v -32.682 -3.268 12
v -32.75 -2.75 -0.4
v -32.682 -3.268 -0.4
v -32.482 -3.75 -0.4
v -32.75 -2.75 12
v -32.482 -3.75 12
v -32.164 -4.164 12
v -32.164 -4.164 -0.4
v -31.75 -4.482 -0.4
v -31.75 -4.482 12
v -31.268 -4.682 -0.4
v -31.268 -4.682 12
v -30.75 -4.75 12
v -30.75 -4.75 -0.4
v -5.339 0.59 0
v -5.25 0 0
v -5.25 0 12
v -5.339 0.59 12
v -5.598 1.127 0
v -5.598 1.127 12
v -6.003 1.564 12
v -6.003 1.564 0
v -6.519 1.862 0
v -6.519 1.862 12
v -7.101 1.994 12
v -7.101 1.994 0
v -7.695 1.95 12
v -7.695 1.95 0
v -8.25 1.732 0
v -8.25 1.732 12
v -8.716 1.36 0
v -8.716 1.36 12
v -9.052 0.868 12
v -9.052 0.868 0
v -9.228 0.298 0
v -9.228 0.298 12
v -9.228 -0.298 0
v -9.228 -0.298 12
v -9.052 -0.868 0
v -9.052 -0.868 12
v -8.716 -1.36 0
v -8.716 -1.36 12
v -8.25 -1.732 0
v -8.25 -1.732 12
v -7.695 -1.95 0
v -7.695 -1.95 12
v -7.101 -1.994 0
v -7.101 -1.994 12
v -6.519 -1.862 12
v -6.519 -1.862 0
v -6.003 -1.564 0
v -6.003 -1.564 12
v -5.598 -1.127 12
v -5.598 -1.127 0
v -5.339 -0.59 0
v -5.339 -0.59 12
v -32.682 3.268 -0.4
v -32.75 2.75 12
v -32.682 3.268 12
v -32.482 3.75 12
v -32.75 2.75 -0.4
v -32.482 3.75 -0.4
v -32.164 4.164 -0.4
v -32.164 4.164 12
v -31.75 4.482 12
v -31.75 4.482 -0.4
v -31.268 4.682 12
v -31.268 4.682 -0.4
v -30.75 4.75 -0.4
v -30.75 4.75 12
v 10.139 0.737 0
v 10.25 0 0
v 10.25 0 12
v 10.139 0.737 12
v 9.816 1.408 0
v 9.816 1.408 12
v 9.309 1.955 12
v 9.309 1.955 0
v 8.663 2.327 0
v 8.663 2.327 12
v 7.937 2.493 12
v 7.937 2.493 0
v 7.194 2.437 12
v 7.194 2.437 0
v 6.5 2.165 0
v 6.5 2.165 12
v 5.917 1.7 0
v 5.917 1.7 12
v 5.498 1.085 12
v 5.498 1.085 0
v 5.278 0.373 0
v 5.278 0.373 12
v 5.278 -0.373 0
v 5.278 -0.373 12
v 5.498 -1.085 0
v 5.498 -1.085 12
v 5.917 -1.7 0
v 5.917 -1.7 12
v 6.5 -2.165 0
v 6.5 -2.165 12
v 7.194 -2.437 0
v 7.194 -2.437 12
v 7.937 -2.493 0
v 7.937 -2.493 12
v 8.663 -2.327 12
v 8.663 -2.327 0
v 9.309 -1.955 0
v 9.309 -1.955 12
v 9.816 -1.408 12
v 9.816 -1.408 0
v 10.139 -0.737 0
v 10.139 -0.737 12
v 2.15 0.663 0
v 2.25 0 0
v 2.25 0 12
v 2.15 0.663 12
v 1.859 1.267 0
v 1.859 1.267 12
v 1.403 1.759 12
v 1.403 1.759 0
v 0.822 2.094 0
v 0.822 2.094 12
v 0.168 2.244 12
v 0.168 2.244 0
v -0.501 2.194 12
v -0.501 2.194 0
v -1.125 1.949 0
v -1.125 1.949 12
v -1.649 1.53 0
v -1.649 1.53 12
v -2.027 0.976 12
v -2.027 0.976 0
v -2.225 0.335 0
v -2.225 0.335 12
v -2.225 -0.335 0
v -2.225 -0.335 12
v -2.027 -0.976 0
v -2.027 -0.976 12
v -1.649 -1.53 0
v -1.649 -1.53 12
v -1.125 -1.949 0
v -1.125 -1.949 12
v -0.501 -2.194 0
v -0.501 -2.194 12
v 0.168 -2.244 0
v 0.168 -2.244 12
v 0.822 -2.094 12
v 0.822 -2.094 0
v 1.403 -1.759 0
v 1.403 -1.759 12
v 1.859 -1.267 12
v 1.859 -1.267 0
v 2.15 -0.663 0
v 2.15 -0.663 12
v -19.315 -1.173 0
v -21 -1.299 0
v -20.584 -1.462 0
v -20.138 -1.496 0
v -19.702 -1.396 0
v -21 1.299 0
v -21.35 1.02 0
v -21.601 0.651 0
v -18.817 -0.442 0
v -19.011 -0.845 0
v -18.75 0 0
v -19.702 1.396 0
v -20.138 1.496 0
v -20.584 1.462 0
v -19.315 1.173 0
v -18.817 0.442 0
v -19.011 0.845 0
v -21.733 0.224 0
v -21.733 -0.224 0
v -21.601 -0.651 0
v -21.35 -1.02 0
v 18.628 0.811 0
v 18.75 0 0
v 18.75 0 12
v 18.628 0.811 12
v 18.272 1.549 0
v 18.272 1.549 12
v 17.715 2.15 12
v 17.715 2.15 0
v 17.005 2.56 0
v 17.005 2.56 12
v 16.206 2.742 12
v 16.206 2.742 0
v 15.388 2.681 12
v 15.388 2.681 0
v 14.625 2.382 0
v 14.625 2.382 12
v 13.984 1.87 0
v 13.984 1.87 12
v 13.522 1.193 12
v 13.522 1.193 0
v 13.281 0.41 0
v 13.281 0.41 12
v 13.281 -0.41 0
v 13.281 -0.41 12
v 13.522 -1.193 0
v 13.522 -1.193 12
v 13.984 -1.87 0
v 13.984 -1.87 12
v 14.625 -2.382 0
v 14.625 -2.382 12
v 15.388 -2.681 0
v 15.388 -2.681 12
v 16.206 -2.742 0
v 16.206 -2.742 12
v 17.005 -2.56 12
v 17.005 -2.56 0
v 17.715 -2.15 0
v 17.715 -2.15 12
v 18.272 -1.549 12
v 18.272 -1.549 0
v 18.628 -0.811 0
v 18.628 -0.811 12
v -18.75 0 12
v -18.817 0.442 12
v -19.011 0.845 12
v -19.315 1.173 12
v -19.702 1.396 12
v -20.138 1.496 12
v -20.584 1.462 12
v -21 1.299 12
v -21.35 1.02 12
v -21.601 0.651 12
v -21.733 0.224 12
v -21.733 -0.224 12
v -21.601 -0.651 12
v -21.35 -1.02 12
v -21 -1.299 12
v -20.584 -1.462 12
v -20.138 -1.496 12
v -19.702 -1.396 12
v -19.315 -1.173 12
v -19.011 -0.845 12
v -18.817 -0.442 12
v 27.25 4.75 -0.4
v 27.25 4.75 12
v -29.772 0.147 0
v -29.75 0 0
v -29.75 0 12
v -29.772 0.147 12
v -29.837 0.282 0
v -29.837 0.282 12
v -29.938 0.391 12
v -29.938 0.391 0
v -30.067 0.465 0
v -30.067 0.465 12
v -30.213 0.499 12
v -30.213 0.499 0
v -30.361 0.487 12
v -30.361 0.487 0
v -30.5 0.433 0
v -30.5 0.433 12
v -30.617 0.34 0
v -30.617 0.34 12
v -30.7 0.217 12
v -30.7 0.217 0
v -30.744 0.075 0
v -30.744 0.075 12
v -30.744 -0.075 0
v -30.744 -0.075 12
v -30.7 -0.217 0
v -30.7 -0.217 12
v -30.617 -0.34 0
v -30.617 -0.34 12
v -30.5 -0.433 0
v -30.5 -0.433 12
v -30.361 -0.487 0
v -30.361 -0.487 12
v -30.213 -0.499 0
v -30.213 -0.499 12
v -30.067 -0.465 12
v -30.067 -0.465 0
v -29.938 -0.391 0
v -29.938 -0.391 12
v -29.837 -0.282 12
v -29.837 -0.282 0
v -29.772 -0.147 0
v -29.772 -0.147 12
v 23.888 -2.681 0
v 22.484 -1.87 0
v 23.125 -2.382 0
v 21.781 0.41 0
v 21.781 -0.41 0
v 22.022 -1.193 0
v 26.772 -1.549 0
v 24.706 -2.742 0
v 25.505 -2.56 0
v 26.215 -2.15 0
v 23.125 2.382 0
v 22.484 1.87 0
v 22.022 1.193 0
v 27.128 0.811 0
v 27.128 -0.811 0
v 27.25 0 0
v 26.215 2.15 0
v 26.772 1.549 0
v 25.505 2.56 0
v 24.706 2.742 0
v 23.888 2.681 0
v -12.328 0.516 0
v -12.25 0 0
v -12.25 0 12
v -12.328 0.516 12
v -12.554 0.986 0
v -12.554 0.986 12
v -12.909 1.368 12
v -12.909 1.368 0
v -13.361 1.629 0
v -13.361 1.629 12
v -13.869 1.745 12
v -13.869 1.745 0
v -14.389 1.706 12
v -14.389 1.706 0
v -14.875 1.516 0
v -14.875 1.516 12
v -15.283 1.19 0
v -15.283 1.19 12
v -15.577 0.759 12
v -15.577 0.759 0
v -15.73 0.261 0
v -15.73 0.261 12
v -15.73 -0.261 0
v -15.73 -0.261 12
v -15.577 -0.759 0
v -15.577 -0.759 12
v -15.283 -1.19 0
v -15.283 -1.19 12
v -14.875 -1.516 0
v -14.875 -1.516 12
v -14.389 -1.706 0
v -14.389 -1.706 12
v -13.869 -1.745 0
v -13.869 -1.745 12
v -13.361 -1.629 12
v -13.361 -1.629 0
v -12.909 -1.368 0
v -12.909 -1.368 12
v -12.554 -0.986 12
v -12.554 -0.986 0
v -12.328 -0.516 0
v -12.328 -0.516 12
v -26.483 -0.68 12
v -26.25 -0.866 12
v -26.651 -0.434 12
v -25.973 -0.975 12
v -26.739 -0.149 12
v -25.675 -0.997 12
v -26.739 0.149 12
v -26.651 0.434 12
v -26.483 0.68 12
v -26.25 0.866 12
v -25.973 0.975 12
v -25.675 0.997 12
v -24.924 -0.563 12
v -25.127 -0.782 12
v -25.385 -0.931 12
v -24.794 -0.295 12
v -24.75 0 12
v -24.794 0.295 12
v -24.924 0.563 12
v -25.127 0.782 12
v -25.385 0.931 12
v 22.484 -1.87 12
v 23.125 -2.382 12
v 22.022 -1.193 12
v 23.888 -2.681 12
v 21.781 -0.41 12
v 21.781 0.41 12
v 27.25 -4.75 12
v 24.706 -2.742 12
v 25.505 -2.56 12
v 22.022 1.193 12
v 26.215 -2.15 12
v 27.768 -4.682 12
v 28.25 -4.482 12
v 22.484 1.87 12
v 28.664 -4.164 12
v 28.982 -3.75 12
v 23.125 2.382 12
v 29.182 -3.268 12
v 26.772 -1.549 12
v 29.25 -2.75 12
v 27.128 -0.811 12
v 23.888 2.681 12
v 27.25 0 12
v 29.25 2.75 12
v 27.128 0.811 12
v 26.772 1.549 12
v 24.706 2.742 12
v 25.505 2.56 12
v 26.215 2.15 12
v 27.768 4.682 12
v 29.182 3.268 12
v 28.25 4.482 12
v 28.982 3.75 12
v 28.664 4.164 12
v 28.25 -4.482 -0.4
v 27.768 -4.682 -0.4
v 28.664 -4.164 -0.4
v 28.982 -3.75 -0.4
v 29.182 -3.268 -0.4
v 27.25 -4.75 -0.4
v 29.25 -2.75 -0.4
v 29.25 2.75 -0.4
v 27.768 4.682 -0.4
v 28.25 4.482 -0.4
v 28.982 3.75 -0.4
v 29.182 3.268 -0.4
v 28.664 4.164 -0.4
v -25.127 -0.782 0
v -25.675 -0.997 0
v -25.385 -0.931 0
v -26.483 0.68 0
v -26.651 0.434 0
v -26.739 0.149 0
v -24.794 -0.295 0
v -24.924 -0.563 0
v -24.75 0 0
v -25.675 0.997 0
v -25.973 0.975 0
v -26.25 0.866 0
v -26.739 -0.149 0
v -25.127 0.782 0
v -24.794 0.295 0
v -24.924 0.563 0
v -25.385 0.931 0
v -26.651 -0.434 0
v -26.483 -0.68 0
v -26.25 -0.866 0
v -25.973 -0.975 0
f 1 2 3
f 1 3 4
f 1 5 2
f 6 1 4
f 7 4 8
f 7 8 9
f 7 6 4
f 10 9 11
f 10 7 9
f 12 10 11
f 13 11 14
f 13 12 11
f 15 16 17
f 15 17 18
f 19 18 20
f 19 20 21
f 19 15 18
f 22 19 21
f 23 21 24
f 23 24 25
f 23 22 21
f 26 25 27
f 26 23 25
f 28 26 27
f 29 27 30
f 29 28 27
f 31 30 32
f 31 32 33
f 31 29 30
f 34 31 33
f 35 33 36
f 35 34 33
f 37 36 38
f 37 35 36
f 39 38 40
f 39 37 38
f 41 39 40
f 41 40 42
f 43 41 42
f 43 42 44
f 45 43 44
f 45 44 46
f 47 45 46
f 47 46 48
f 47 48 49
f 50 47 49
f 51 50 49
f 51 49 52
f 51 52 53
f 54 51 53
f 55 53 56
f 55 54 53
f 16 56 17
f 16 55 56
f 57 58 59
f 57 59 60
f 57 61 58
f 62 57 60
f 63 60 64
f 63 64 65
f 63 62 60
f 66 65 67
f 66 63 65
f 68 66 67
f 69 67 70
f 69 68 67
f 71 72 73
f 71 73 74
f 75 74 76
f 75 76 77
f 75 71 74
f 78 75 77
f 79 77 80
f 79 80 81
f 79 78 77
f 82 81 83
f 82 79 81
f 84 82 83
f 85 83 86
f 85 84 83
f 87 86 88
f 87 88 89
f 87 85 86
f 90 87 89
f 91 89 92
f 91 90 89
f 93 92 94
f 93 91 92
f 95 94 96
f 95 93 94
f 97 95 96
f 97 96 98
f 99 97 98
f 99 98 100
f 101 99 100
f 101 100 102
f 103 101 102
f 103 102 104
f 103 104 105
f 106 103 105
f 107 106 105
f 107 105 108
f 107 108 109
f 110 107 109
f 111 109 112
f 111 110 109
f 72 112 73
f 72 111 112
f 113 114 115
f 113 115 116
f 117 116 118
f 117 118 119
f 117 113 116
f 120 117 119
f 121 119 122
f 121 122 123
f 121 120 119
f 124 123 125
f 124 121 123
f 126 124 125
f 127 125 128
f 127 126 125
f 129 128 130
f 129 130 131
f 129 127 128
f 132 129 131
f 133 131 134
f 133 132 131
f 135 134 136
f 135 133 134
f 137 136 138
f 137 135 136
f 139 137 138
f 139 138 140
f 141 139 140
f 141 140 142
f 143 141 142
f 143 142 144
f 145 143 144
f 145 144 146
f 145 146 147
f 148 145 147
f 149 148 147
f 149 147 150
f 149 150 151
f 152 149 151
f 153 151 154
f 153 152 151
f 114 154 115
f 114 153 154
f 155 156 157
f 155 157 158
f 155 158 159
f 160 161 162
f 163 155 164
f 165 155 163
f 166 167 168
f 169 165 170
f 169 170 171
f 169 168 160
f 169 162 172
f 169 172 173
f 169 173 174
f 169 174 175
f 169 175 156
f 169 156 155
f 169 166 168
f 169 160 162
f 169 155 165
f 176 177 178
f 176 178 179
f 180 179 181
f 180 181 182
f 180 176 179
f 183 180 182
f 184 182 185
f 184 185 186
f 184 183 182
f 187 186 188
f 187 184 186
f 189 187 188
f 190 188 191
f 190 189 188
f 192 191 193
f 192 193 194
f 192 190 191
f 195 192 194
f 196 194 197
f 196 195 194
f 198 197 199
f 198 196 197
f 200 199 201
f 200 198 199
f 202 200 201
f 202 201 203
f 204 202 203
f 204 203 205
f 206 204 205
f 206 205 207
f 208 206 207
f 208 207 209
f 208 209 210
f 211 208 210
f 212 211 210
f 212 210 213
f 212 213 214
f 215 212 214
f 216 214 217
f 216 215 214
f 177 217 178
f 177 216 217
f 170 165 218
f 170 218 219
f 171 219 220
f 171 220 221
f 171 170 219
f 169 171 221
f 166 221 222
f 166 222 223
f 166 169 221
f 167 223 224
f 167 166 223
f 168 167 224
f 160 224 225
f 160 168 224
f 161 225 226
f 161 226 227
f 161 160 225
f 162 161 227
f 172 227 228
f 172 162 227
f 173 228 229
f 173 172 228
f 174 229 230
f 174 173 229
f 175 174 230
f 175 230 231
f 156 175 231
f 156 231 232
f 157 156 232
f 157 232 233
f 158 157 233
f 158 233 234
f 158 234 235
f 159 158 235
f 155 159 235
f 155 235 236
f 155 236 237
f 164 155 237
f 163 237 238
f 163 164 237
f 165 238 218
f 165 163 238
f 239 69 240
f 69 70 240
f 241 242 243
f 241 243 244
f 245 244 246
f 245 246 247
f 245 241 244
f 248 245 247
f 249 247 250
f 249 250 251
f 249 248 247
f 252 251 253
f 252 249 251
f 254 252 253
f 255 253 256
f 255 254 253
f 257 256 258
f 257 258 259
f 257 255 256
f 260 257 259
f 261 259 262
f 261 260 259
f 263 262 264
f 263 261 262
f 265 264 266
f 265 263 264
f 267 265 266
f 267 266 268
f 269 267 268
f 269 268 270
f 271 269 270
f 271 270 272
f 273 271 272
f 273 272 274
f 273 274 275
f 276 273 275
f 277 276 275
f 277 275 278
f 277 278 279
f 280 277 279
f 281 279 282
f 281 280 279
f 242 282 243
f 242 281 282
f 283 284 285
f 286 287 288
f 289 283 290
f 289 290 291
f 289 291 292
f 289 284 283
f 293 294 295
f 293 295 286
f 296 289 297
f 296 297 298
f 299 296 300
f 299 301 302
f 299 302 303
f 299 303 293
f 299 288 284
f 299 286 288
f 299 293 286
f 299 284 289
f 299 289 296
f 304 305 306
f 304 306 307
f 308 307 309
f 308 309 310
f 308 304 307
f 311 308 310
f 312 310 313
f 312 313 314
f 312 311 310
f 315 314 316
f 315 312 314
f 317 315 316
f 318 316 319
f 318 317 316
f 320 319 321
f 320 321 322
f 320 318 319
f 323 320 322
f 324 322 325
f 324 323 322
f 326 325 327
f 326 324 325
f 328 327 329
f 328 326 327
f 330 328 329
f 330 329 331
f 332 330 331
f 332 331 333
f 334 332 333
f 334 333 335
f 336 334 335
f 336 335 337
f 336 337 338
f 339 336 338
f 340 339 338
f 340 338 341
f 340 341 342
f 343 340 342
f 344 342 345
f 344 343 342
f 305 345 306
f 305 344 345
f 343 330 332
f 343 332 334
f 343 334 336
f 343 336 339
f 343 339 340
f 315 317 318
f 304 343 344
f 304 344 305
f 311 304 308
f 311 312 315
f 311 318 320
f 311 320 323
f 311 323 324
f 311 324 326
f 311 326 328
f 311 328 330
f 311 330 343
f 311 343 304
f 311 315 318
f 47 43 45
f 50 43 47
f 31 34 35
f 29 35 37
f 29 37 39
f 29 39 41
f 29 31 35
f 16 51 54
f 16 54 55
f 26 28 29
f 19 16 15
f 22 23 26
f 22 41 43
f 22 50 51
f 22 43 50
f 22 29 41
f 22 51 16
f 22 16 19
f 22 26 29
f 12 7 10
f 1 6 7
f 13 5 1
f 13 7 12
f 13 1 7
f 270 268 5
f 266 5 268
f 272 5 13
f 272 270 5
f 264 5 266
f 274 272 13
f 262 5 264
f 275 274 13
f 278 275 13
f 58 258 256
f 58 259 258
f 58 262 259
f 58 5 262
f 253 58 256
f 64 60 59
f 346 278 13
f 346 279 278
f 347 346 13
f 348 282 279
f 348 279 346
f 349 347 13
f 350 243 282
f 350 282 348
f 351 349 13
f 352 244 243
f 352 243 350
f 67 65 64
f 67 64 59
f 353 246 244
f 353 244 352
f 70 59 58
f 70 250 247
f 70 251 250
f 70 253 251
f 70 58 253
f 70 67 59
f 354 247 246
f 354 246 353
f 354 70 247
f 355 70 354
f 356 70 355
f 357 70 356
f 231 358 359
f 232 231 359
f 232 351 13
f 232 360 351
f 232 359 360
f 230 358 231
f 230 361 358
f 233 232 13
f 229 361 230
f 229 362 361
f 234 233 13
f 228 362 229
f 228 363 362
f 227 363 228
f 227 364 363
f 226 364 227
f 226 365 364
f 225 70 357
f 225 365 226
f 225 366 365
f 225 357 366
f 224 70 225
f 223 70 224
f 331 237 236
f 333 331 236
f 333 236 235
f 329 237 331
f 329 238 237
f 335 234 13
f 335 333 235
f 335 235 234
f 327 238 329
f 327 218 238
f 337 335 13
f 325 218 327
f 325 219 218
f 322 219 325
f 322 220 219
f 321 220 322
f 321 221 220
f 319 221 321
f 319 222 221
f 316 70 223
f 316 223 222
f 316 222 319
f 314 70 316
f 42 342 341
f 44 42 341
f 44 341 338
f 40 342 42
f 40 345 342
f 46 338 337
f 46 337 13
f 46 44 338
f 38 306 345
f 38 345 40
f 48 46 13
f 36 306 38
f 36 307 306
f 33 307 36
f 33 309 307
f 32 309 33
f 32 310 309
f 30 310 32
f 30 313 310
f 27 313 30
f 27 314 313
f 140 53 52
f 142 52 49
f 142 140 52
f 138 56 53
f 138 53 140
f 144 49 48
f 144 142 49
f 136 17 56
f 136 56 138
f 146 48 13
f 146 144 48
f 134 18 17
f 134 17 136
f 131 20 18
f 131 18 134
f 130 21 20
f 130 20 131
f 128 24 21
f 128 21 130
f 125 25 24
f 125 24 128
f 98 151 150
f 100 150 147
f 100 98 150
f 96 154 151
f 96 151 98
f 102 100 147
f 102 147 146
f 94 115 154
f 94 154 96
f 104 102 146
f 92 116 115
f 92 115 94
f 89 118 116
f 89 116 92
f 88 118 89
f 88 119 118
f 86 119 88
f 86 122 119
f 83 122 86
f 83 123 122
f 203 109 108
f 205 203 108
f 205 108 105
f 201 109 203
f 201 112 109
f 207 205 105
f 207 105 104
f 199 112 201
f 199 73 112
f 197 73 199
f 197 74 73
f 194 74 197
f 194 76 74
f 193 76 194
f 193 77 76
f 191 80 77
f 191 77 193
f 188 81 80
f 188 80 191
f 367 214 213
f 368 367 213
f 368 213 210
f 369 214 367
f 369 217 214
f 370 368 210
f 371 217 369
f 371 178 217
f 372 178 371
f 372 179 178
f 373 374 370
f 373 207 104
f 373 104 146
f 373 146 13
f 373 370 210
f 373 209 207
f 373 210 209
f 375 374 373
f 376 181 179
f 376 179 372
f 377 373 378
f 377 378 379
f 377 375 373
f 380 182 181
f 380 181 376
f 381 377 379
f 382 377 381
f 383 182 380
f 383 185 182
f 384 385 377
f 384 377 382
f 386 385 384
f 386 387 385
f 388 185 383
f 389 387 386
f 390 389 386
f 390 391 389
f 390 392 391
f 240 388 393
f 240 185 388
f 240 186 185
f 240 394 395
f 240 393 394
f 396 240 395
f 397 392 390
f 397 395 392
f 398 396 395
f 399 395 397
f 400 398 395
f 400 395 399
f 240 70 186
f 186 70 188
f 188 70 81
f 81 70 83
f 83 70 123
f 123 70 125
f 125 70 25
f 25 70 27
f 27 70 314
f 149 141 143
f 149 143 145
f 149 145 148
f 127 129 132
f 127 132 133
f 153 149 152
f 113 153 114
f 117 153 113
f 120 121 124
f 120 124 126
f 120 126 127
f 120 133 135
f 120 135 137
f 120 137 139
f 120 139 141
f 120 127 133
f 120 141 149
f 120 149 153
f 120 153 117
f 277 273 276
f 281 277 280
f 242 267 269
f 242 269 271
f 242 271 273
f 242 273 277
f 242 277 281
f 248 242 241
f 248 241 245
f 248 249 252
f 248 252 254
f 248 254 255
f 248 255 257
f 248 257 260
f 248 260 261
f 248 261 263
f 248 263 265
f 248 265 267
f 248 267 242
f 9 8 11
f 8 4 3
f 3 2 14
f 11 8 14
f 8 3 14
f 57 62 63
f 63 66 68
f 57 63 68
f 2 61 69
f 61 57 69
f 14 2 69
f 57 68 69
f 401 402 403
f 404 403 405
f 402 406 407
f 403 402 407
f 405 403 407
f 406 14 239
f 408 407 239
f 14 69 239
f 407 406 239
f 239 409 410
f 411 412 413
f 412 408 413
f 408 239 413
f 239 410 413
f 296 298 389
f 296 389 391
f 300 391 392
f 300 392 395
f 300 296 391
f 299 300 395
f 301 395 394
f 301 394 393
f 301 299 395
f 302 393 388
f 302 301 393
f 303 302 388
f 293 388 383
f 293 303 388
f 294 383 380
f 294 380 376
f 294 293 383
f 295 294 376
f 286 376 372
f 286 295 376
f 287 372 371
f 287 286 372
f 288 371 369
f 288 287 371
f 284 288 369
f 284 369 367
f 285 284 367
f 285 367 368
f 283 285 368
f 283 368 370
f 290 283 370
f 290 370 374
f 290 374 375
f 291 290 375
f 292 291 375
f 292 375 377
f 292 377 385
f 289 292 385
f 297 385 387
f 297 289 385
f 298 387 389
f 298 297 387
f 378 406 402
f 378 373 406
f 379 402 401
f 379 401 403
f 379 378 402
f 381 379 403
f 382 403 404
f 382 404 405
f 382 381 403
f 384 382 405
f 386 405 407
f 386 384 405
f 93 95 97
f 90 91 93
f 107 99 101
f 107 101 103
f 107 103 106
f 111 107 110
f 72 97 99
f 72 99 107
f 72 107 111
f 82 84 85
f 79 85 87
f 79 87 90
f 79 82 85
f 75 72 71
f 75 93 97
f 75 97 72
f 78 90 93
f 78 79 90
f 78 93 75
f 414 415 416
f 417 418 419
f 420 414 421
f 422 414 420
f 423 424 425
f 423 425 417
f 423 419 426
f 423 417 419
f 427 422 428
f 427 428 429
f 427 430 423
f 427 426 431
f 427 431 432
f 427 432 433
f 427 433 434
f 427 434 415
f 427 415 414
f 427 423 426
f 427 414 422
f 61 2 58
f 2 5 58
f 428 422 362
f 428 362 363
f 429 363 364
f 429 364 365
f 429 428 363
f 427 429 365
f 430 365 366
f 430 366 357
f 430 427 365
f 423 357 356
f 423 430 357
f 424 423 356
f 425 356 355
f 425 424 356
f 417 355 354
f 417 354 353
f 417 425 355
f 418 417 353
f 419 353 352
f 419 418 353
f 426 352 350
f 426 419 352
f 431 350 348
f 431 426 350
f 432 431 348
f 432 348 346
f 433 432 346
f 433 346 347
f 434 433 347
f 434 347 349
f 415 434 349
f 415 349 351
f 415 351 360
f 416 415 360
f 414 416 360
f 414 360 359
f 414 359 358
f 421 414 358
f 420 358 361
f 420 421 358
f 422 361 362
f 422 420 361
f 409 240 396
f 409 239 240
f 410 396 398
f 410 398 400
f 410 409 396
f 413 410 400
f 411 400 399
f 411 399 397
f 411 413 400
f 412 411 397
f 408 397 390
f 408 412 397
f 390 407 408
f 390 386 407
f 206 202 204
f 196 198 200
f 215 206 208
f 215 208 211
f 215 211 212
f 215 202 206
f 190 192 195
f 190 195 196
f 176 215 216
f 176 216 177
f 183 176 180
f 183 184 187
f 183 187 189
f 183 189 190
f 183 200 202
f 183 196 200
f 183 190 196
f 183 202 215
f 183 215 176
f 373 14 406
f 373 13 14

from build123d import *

# Parameters (mm, degrees)
F0_W          = 62
F0_H          = 9.5
F0_R          = 0.5
F0_R_2        = 1
F0_R_3        = 1.5
F0_R_4        = 1.75
F0_R_5        = 2
F0_R_6        = 2.25
F0_R_7        = 2.5
F0_R_8        = 2.75
F1_DEPTH      = 12
F1_DEPTH_BACK = 0.4
F2_DEPTH      = 0.4
F3_R          = 2


with BuildPart() as f1:
    # F0 (on Top) → F1 (new body, two sides)
    with BuildSketch(Plane.XY) as f1_sk:
        with Locations((-1.75, 0)):
            Rectangle(F0_W, F0_H)
        with Locations((-30.25, 0)):
            Circle(F0_R, mode=Mode.SUBTRACT)
        with Locations((-25.75, 0)):
            Circle(F0_R_2, mode=Mode.SUBTRACT)
        with Locations((-20.25, 0)):
            Circle(F0_R_3, mode=Mode.SUBTRACT)
        with Locations((-14, 0)):
            Circle(F0_R_4, mode=Mode.SUBTRACT)
        with Locations((-7.25, 0)):
            Circle(F0_R_5, mode=Mode.SUBTRACT)
        Circle(F0_R_6, mode=Mode.SUBTRACT)
        with Locations((7.75, 0)):
            Circle(F0_R_7, mode=Mode.SUBTRACT)
        with Locations((16, 0)):
            Circle(F0_R_8, mode=Mode.SUBTRACT)
        with Locations((24.5, 0)):
            Circle(F0_R_8, mode=Mode.SUBTRACT)
    extrude(amount=F1_DEPTH)
    extrude(f1_sk.sketch, amount=-F1_DEPTH_BACK)

    # F0 (on Top) → F2 (join)
    with BuildSketch(Plane.XY):
        with Locations((-25.75, 0)):
            Circle(F0_R_2)
        with Locations((-20.25, 0)):
            Circle(F0_R_3)
        with Locations((-30.25, 0)):
            Circle(F0_R)
        with Locations((-14, 0)):
            Circle(F0_R_4)
        with Locations((-7.25, 0)):
            Circle(F0_R_5)
        Circle(F0_R_6)
        with Locations((7.75, 0)):
            Circle(F0_R_7)
        with Locations((16, 0)):
            Circle(F0_R_8)
        with Locations((24.5, 0)):
            Circle(F0_R_8)
    extrude(amount=-F2_DEPTH)

    # F3
    f3_edges = [f1.edges().sort_by_distance(p)[0] for p in [
        (-32.75, -4.75, 5.8),
        (29.25, -4.75, 5.8),
        (29.25, 4.75, 5.8),
        (-32.75, 4.75, 5.8),
    ]]
    fillet(f3_edges, radius=F3_R)


solid = f1.part
